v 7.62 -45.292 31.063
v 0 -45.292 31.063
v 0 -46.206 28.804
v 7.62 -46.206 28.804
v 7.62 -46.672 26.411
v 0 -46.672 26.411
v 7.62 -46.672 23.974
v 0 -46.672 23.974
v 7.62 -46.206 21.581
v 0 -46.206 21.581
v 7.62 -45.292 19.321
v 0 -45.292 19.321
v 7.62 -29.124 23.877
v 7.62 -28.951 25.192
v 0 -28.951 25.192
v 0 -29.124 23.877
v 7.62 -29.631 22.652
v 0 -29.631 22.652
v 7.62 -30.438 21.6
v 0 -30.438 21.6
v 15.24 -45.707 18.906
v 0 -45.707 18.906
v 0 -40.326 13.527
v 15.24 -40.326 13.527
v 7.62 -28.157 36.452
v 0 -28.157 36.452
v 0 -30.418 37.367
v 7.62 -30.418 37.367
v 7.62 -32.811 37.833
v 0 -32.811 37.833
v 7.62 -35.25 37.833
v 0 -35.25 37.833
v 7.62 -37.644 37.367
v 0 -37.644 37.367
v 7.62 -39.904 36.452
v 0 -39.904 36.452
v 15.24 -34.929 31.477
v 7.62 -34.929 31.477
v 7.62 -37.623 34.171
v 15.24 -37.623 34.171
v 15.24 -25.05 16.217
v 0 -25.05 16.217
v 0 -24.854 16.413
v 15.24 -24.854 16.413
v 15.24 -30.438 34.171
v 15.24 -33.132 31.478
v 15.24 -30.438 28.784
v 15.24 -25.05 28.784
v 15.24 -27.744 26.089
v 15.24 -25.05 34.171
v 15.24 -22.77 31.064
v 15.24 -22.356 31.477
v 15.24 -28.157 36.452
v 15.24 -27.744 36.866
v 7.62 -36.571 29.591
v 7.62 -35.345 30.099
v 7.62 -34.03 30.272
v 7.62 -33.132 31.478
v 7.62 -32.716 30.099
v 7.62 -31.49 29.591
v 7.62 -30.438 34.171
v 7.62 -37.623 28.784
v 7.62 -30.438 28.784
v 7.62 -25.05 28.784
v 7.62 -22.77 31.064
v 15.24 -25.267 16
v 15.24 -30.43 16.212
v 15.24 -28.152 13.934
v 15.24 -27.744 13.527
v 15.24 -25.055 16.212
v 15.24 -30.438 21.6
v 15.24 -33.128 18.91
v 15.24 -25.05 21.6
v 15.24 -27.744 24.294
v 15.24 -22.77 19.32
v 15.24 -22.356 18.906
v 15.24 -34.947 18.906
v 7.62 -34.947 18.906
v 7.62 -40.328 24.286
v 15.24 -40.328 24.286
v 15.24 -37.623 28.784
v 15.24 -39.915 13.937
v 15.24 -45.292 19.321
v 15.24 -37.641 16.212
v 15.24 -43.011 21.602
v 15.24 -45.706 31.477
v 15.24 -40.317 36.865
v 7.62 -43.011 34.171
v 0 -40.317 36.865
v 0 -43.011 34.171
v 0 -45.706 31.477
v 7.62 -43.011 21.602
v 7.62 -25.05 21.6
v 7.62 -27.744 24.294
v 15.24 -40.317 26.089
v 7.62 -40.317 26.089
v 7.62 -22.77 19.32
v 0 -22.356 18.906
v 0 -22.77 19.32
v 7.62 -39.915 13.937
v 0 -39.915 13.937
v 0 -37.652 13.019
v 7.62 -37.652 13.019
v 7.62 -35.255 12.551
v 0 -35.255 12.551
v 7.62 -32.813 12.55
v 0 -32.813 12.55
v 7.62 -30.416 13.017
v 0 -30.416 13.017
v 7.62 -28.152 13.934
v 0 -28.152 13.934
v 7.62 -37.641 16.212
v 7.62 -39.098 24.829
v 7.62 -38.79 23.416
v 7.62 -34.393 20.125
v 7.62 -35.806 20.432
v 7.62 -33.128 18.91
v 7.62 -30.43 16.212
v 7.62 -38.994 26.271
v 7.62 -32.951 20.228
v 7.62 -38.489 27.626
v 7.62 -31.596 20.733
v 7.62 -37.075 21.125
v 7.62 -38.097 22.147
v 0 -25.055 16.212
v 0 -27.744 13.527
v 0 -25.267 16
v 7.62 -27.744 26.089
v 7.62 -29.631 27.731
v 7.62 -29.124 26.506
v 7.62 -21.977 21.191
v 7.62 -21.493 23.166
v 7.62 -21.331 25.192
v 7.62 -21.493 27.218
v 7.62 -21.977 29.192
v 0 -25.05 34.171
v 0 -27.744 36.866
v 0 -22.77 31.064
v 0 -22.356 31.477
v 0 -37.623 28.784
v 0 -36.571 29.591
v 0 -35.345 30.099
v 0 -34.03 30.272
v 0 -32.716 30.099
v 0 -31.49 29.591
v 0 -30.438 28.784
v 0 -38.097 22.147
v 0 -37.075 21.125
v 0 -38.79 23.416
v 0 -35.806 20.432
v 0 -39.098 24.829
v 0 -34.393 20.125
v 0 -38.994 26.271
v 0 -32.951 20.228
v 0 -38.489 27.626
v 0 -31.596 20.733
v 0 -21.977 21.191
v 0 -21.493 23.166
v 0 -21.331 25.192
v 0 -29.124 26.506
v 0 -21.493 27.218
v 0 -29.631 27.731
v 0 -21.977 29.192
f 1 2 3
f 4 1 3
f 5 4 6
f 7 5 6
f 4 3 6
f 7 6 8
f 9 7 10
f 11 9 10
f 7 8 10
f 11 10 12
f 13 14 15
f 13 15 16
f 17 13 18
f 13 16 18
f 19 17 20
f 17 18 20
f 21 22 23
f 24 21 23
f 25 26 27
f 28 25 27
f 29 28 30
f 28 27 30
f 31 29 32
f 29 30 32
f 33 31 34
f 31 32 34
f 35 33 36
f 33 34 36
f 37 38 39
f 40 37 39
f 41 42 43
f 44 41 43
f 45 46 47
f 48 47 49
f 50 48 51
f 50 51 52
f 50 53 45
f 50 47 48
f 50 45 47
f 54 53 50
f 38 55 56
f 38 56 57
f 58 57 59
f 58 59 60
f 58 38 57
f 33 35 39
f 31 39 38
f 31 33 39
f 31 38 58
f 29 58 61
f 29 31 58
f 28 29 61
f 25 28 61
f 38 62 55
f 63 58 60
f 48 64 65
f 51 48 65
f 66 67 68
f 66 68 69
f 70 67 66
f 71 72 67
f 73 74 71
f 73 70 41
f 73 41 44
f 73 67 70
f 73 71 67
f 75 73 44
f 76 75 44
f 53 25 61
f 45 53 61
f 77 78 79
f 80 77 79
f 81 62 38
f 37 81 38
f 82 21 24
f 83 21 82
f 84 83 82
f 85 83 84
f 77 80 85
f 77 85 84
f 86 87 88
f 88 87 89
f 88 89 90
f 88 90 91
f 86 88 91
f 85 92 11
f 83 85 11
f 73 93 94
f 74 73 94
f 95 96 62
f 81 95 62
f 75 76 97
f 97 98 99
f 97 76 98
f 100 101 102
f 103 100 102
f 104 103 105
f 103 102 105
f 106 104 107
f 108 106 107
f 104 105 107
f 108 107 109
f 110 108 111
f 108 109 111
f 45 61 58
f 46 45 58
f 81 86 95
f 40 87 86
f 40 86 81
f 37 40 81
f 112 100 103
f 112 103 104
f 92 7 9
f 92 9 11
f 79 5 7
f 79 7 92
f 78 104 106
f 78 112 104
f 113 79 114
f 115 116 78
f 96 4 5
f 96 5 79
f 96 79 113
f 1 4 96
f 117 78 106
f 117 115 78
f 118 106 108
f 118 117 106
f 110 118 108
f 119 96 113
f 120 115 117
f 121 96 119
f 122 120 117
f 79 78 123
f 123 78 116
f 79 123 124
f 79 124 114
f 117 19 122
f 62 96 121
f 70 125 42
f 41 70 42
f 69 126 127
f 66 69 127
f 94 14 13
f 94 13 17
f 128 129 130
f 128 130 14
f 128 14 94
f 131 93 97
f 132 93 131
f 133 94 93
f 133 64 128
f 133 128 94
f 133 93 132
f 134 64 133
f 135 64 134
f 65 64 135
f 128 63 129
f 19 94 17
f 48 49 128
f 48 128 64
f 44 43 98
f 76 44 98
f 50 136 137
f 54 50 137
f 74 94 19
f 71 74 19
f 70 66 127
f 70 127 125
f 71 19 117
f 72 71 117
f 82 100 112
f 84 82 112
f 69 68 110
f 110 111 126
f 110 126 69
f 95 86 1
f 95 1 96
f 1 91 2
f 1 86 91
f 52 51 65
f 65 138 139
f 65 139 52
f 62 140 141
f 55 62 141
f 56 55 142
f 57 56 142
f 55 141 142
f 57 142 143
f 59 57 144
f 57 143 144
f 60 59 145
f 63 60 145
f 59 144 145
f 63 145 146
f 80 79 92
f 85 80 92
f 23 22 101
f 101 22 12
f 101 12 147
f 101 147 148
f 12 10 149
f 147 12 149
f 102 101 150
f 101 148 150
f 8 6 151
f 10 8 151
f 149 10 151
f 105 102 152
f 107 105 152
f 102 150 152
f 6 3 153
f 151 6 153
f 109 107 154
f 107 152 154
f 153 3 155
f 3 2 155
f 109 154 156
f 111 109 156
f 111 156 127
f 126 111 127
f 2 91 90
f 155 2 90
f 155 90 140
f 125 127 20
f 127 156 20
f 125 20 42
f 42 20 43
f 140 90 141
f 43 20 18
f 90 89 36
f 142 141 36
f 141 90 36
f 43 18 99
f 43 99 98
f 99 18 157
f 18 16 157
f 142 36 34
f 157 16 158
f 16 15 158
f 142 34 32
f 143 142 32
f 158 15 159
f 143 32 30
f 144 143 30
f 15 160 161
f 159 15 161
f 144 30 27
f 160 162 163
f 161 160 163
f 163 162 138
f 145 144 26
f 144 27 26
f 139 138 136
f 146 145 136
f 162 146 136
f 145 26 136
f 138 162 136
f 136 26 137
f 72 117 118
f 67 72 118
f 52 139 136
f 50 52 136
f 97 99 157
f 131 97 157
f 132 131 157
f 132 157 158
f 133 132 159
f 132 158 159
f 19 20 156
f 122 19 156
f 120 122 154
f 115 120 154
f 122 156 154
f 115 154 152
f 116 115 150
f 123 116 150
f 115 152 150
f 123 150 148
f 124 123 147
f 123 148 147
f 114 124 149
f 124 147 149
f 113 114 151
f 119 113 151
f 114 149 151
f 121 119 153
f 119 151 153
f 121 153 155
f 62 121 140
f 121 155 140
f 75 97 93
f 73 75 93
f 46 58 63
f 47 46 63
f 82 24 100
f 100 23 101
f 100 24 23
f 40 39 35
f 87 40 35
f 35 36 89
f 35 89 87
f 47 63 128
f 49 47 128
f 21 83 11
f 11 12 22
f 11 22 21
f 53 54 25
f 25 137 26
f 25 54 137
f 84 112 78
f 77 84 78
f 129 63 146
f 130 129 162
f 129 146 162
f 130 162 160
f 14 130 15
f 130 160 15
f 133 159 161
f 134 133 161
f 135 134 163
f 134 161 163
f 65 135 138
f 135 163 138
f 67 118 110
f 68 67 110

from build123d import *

# Parameters (mm, degrees)
F1_DEPTH = 7.62
F2_DEPTH = 15.24


with BuildPart() as f1:
    # F0 (on Right) → F1 (new body)
    with BuildSketch(Plane.YZ):
        with BuildLine():
            ThreePointArc((-22.7695842606, 19.3196809519), (-21.6955753206, 22.1687878641), (-21.330579045, 25.1916479534))
            ThreePointArc((-21.330579045, 25.1916479534), (-21.6955753206, 28.2145080427), (-22.7695842606, 31.063614955))
            Line((-22.7695842606, 31.063614955), (-25.0498647737, 28.7835671044))
            Line((-25.0498647737, 28.7835671044), (-25.0498647737, 21.5997288025))
            Line((-25.0498647737, 21.5997288025), (-22.7695842606, 19.3196809519))
        make_face()
        with BuildLine():
            Line((-25.0498647737, 28.7835671044), (-22.7695842606, 31.063614955))
            ThreePointArc((-22.7695842606, 31.063614955), (-23.7911283922, 32.7045468833), (-25.0498647737, 34.1714459009))
            Line((-25.0498647737, 34.1714459009), (-25.0498647737, 28.7835671044))
        make_face()
        with BuildLine():
            ThreePointArc((-24.8535283353, 16.4125967363), (-23.7086988595, 17.7924054626), (-22.7695842606, 19.3196809519))
            Line((-22.7695842606, 19.3196809519), (-25.0498647737, 21.5997288025))
            Line((-25.0498647737, 21.5997288025), (-25.0498647737, 16.2165853811))
            Line((-25.0498647737, 16.2165853811), (-24.8535283353, 16.4125967363))
        make_face()
        with BuildLine():
            Line((-30.4382933645, 34.1714459009), (-25.0498647737, 34.1714459009))
            ThreePointArc((-25.0498647737, 34.1714459009), (-26.5166353453, 35.4303319547), (-28.1574630291, 36.4520435177))
            Line((-28.1574630291, 36.4520435177), (-30.4382933645, 34.1714459009))
        make_face()
        Polygon((-25.0498647737, 28.7835671044), (-25.0498647737, 34.1714459009), (-30.4382933645, 34.1714459009), (-33.1322327207, 31.4777814138), (-30.4382933285, 28.7835671244), (-27.7443539522, 26.089352851), align=None)
        with BuildLine():
            Line((-25.0498647737, 21.5997288025), (-25.0498647737, 28.7835671044))
            Line((-25.0498647737, 28.7835671044), (-27.7443539522, 26.089352851))
            Line((-27.7443539522, 26.089352851), (-30.4382933285, 28.7835671244))
            ThreePointArc((-30.4382933285, 28.7835671244), (-29.3372214281, 27.1355600605), (-28.950579045, 25.1916479534))
            ThreePointArc((-28.950579045, 25.1916479534), (-29.3372214494, 23.2477357949), (-30.4382934071, 21.5997287037))
            Line((-30.4382934071, 21.5997287037), (-27.7443539522, 24.2939430558))
            Line((-27.7443539522, 24.2939430558), (-25.0498647737, 21.5997288025))
        make_face()
        Polygon((-25.0498647737, 16.2165853811), (-25.0498647737, 21.5997288025), (-27.7443539522, 24.2939430558), (-30.4382934071, 21.5997287037), (-33.1280466566, 18.9097009843), (-30.4299203819, 16.2118500059), (-25.0546080025, 16.2118500059), align=None)
        with BuildLine():
            Line((-30.4382933645, 34.1714459009), (-28.1574630291, 36.4520435177))
            ThreePointArc((-28.1574630291, 36.4520435177), (-34.0306965605, 37.8916479529), (-39.9039034491, 36.4519348256))
            Line((-39.9039034491, 36.4519348256), (-37.6234145244, 34.1714459009))
            Line((-37.6234145244, 34.1714459009), (-30.4382933645, 34.1714459009))
        make_face()
        with BuildLine():
            Line((-33.1322327207, 31.4777814138), (-30.4382933645, 34.1714459009))
            Line((-30.4382933645, 34.1714459009), (-37.6234145244, 34.1714459009))
            Line((-37.6234145244, 34.1714459009), (-34.9292002593, 31.4772316359))
            Line((-34.9292002593, 31.4772316359), (-37.6226815049, 28.7837503904))
            ThreePointArc((-37.6226815049, 28.7837503904), (-34.0304494597, 30.2716479518), (-30.4382933285, 28.7835671244))
            Line((-30.4382933285, 28.7835671244), (-33.1322327207, 31.4777814138))
        make_face()
        with BuildLine():
            Line((-37.6234145244, 34.1714459009), (-39.9039034491, 36.4519348256))
            ThreePointArc((-39.9039034491, 36.4519348256), (-41.5446174849, 35.4302624263), (-43.0112933162, 34.1714459009))
            Line((-43.0112933162, 34.1714459009), (-37.6234145244, 34.1714459009))
        make_face()
        Polygon((-34.9292002593, 31.4772316359), (-37.6234145244, 34.1714459009), (-43.0112933162, 34.1714459009), (-43.0112933162, 28.7830173475), (-40.317353932, 26.0890779633), (-37.6226815049, 28.7837503904), align=None)
        with BuildLine():
            ThreePointArc((-28.1519614983, 13.9341235479), (-26.6368414576, 14.865823798), (-25.2667473216, 16.0000619355))
            Line((-25.2667473216, 16.0000619355), (-25.0546080025, 16.2118500059))
            Line((-25.0546080025, 16.2118500059), (-30.4299203819, 16.2118500059))
            Line((-30.4299203819, 16.2118500059), (-28.1519614983, 13.9341235479))
        make_face()
        with BuildLine():
            Line((-33.1280466566, 18.9097009843), (-30.4382934071, 21.5997287037))
            ThreePointArc((-30.4382934071, 21.5997287037), (-37.6225898895, 21.5994539034), (-37.6226815049, 28.7837503904))
            Line((-37.6226815049, 28.7837503904), (-40.317353932, 26.0890779633))
            Line((-40.317353932, 26.0890779633), (-43.0112933162, 28.7830173475))
            Line((-43.0112933162, 28.7830173475), (-43.0112933162, 21.6024270559))
            Line((-43.0112933162, 21.6024270559), (-40.3278979877, 24.2860962057))
            Line((-40.3278979877, 24.2860962057), (-34.9473170757, 18.9060642873))
            Line((-34.9473170757, 18.9060642873), (-37.64125646, 16.2118500059))
            Line((-37.64125646, 16.2118500059), (-30.4299203819, 16.2118500059))
            Line((-30.4299203819, 16.2118500059), (-33.1280466566, 18.9097009843))
        make_face()
        with BuildLine():
            Line((-43.0112933162, 28.7830173475), (-43.0112933162, 34.1714459009))
            ThreePointArc((-43.0112933162, 34.1714459009), (-44.2700992213, 32.7044521275), (-45.2916825052, 31.0634065365))
            Line((-45.2916825052, 31.0634065365), (-43.0112933162, 28.7830173475))
        make_face()
        with BuildLine():
            ThreePointArc((-39.9154717637, 13.9374026349), (-34.034119179, 12.4916484468), (-28.1519614983, 13.9341235479))
            Line((-28.1519614983, 13.9341235479), (-30.4299203819, 16.2118500059))
            Line((-30.4299203819, 16.2118500059), (-37.64125646, 16.2118500059))
            Line((-37.64125646, 16.2118500059), (-39.9154717637, 13.9374026349))
        make_face()
        with BuildLine():
            Line((-43.0112933162, 28.7830173475), (-45.2916825052, 31.0634065365))
            ThreePointArc((-45.2916825052, 31.0634065365), (-46.7305790251, 25.1923579991), (-45.2923390044, 19.3211486035))
            Line((-45.2923390044, 19.3211486035), (-43.0112933162, 21.6024270559))
            Line((-43.0112933162, 21.6024270559), (-43.0112933162, 28.7830173475))
        make_face()
        with BuildLine():
            Line((-40.3262748881, 13.526557591), (-39.9154717637, 13.9374026349))
            ThreePointArc((-39.9154717637, 13.9374026349), (-41.5498772506, 14.9568956607), (-43.0112933162, 16.2118500059))
            ThreePointArc((-43.0112933162, 16.2118500059), (-44.2705192395, 17.6794162735), (-45.2923390044, 19.3211486035))
            Line((-45.2923390044, 19.3211486035), (-45.7073809685, 18.9060642873))
            Line((-45.7073809685, 18.9060642873), (-40.3262748881, 13.526557591))
        make_face()
        with BuildLine():
            ThreePointArc((-43.0112933162, 16.2118500059), (-41.5498772506, 14.9568956607), (-39.9154717637, 13.9374026349))
            Line((-39.9154717637, 13.9374026349), (-37.64125646, 16.2118500059))
            Line((-37.64125646, 16.2118500059), (-43.0112933162, 16.2118500059))
        make_face()
        Polygon((-43.0112933162, 16.2118500059), (-37.64125646, 16.2118500059), (-34.9473170757, 18.9060642873), (-40.3278979877, 24.2860962057), (-43.0112933162, 21.6024270559), align=None)
        with BuildLine():
            Line((-43.0112933162, 21.6024270559), (-45.2923390044, 19.3211486035))
            ThreePointArc((-45.2923390044, 19.3211486035), (-44.2705192395, 17.6794162735), (-43.0112933162, 16.2118500059))
            Line((-43.0112933162, 16.2118500059), (-43.0112933162, 21.6024270559))
        make_face()
    extrude(amount=F1_DEPTH)

    # F0 (on Right) → F2 (join)
    with BuildSketch(Plane.YZ):
        with BuildLine():
            Line((-25.0498647737, 28.7835671044), (-22.7695842606, 31.063614955))
            ThreePointArc((-22.7695842606, 31.063614955), (-23.7911283922, 32.7045468833), (-25.0498647737, 34.1714459009))
            Line((-25.0498647737, 34.1714459009), (-25.0498647737, 28.7835671044))
        make_face()
        with BuildLine():
            ThreePointArc((-25.0498647737, 34.1714459009), (-23.7911283922, 32.7045468833), (-22.7695842606, 31.063614955))
            Line((-22.7695842606, 31.063614955), (-22.3559253895, 31.4772316195))
            Line((-22.3559253895, 31.4772316195), (-25.0498647737, 34.1714459009))
        make_face()
        with BuildLine():
            Line((-22.3559253895, 18.9060642873), (-22.7695842606, 19.3196809519))
            ThreePointArc((-22.7695842606, 19.3196809519), (-23.7086988595, 17.7924054626), (-24.8535283353, 16.4125967363))
            Line((-24.8535283353, 16.4125967363), (-22.3559253895, 18.9060642873))
        make_face()
        with BuildLine():
            ThreePointArc((-24.8535283353, 16.4125967363), (-23.7086988595, 17.7924054626), (-22.7695842606, 19.3196809519))
            Line((-22.7695842606, 19.3196809519), (-25.0498647737, 21.5997288025))
            Line((-25.0498647737, 21.5997288025), (-25.0498647737, 16.2165853811))
            Line((-25.0498647737, 16.2165853811), (-24.8535283353, 16.4125967363))
        make_face()
        with BuildLine():
            Line((-30.4382933645, 34.1714459009), (-25.0498647737, 34.1714459009))
            ThreePointArc((-25.0498647737, 34.1714459009), (-26.5166353453, 35.4303319547), (-28.1574630291, 36.4520435177))
            Line((-28.1574630291, 36.4520435177), (-30.4382933645, 34.1714459009))
        make_face()
        Polygon((-25.0498647737, 28.7835671044), (-25.0498647737, 34.1714459009), (-30.4382933645, 34.1714459009), (-33.1322327207, 31.4777814138), (-30.4382933285, 28.7835671244), (-27.7443539522, 26.089352851), align=None)
        with BuildLine():
            ThreePointArc((-28.1574630291, 36.4520435177), (-26.5166353453, 35.4303319547), (-25.0498647737, 34.1714459009))
            Line((-25.0498647737, 34.1714459009), (-27.743804158, 36.8656601823))
            Line((-27.743804158, 36.8656601823), (-28.1574630291, 36.4520435177))
        make_face()
        Polygon((-25.0498647737, 16.2165853811), (-25.0498647737, 21.5997288025), (-27.7443539522, 24.2939430558), (-30.4382934071, 21.5997287037), (-33.1280466566, 18.9097009843), (-30.4299203819, 16.2118500059), (-25.0546080025, 16.2118500059), align=None)
        with BuildLine():
            Line((-37.6234145244, 34.1714459009), (-39.9039034491, 36.4519348256))
            ThreePointArc((-39.9039034491, 36.4519348256), (-41.5446174849, 35.4302624263), (-43.0112933162, 34.1714459009))
            Line((-43.0112933162, 34.1714459009), (-37.6234145244, 34.1714459009))
        make_face()
        with BuildLine():
            ThreePointArc((-43.0112933162, 34.1714459009), (-41.5446174849, 35.4302624263), (-39.9039034491, 36.4519348256))
            Line((-39.9039034491, 36.4519348256), (-40.317353932, 36.8653853085))
            Line((-40.317353932, 36.8653853085), (-43.0112933279, 34.1714459126))
        make_face()
        Polygon((-34.9292002593, 31.4772316359), (-37.6234145244, 34.1714459009), (-43.0112933162, 34.1714459009), (-43.0112933162, 28.7830173475), (-40.317353932, 26.0890779633), (-37.6226815049, 28.7837503904), align=None)
        with BuildLine():
            Line((-27.7443539522, 13.526557591), (-25.2667473216, 16.0000619355))
            ThreePointArc((-25.2667473216, 16.0000619355), (-26.6368414576, 14.865823798), (-28.1519614983, 13.9341235479))
            Line((-28.1519614983, 13.9341235479), (-27.7443539522, 13.526557591))
        make_face()
        with BuildLine():
            ThreePointArc((-28.1519614983, 13.9341235479), (-26.6368414576, 14.865823798), (-25.2667473216, 16.0000619355))
            Line((-25.2667473216, 16.0000619355), (-25.0546080025, 16.2118500059))
            Line((-25.0546080025, 16.2118500059), (-30.4299203819, 16.2118500059))
            Line((-30.4299203819, 16.2118500059), (-28.1519614983, 13.9341235479))
        make_face()
        with BuildLine():
            Line((-43.0112933162, 28.7830173475), (-43.0112933162, 34.1714459009))
            ThreePointArc((-43.0112933162, 34.1714459009), (-44.2700992213, 32.7044521275), (-45.2916825052, 31.0634065365))
            Line((-45.2916825052, 31.0634065365), (-43.0112933162, 28.7830173475))
        make_face()
        with BuildLine():
            ThreePointArc((-45.2916825052, 31.0634065365), (-44.2700992213, 32.7044521275), (-43.0112933162, 34.1714459009))
            Line((-43.0112933279, 34.1714459126), (-45.7055076046, 31.4772316359))
            Line((-45.7055076046, 31.4772316359), (-45.2916825052, 31.0634065365))
        make_face()
        with BuildLine():
            Line((-40.3262748881, 13.526557591), (-39.9154717637, 13.9374026349))
            ThreePointArc((-39.9154717637, 13.9374026349), (-41.5498772506, 14.9568956607), (-43.0112933162, 16.2118500059))
            ThreePointArc((-43.0112933162, 16.2118500059), (-44.2705192395, 17.6794162735), (-45.2923390044, 19.3211486035))
            Line((-45.2923390044, 19.3211486035), (-45.7073809685, 18.9060642873))
            Line((-45.7073809685, 18.9060642873), (-40.3262748881, 13.526557591))
        make_face()
        with BuildLine():
            ThreePointArc((-43.0112933162, 16.2118500059), (-41.5498772506, 14.9568956607), (-39.9154717637, 13.9374026349))
            Line((-39.9154717637, 13.9374026349), (-37.64125646, 16.2118500059))
            Line((-37.64125646, 16.2118500059), (-43.0112933162, 16.2118500059))
        make_face()
        Polygon((-43.0112933162, 16.2118500059), (-37.64125646, 16.2118500059), (-34.9473170757, 18.9060642873), (-40.3278979877, 24.2860962057), (-43.0112933162, 21.6024270559), align=None)
        with BuildLine():
            Line((-43.0112933162, 21.6024270559), (-45.2923390044, 19.3211486035))
            ThreePointArc((-45.2923390044, 19.3211486035), (-44.2705192395, 17.6794162735), (-43.0112933162, 16.2118500059))
            Line((-43.0112933162, 16.2118500059), (-43.0112933162, 21.6024270559))
        make_face()
    extrude(amount=F2_DEPTH)


solid = f1.part
